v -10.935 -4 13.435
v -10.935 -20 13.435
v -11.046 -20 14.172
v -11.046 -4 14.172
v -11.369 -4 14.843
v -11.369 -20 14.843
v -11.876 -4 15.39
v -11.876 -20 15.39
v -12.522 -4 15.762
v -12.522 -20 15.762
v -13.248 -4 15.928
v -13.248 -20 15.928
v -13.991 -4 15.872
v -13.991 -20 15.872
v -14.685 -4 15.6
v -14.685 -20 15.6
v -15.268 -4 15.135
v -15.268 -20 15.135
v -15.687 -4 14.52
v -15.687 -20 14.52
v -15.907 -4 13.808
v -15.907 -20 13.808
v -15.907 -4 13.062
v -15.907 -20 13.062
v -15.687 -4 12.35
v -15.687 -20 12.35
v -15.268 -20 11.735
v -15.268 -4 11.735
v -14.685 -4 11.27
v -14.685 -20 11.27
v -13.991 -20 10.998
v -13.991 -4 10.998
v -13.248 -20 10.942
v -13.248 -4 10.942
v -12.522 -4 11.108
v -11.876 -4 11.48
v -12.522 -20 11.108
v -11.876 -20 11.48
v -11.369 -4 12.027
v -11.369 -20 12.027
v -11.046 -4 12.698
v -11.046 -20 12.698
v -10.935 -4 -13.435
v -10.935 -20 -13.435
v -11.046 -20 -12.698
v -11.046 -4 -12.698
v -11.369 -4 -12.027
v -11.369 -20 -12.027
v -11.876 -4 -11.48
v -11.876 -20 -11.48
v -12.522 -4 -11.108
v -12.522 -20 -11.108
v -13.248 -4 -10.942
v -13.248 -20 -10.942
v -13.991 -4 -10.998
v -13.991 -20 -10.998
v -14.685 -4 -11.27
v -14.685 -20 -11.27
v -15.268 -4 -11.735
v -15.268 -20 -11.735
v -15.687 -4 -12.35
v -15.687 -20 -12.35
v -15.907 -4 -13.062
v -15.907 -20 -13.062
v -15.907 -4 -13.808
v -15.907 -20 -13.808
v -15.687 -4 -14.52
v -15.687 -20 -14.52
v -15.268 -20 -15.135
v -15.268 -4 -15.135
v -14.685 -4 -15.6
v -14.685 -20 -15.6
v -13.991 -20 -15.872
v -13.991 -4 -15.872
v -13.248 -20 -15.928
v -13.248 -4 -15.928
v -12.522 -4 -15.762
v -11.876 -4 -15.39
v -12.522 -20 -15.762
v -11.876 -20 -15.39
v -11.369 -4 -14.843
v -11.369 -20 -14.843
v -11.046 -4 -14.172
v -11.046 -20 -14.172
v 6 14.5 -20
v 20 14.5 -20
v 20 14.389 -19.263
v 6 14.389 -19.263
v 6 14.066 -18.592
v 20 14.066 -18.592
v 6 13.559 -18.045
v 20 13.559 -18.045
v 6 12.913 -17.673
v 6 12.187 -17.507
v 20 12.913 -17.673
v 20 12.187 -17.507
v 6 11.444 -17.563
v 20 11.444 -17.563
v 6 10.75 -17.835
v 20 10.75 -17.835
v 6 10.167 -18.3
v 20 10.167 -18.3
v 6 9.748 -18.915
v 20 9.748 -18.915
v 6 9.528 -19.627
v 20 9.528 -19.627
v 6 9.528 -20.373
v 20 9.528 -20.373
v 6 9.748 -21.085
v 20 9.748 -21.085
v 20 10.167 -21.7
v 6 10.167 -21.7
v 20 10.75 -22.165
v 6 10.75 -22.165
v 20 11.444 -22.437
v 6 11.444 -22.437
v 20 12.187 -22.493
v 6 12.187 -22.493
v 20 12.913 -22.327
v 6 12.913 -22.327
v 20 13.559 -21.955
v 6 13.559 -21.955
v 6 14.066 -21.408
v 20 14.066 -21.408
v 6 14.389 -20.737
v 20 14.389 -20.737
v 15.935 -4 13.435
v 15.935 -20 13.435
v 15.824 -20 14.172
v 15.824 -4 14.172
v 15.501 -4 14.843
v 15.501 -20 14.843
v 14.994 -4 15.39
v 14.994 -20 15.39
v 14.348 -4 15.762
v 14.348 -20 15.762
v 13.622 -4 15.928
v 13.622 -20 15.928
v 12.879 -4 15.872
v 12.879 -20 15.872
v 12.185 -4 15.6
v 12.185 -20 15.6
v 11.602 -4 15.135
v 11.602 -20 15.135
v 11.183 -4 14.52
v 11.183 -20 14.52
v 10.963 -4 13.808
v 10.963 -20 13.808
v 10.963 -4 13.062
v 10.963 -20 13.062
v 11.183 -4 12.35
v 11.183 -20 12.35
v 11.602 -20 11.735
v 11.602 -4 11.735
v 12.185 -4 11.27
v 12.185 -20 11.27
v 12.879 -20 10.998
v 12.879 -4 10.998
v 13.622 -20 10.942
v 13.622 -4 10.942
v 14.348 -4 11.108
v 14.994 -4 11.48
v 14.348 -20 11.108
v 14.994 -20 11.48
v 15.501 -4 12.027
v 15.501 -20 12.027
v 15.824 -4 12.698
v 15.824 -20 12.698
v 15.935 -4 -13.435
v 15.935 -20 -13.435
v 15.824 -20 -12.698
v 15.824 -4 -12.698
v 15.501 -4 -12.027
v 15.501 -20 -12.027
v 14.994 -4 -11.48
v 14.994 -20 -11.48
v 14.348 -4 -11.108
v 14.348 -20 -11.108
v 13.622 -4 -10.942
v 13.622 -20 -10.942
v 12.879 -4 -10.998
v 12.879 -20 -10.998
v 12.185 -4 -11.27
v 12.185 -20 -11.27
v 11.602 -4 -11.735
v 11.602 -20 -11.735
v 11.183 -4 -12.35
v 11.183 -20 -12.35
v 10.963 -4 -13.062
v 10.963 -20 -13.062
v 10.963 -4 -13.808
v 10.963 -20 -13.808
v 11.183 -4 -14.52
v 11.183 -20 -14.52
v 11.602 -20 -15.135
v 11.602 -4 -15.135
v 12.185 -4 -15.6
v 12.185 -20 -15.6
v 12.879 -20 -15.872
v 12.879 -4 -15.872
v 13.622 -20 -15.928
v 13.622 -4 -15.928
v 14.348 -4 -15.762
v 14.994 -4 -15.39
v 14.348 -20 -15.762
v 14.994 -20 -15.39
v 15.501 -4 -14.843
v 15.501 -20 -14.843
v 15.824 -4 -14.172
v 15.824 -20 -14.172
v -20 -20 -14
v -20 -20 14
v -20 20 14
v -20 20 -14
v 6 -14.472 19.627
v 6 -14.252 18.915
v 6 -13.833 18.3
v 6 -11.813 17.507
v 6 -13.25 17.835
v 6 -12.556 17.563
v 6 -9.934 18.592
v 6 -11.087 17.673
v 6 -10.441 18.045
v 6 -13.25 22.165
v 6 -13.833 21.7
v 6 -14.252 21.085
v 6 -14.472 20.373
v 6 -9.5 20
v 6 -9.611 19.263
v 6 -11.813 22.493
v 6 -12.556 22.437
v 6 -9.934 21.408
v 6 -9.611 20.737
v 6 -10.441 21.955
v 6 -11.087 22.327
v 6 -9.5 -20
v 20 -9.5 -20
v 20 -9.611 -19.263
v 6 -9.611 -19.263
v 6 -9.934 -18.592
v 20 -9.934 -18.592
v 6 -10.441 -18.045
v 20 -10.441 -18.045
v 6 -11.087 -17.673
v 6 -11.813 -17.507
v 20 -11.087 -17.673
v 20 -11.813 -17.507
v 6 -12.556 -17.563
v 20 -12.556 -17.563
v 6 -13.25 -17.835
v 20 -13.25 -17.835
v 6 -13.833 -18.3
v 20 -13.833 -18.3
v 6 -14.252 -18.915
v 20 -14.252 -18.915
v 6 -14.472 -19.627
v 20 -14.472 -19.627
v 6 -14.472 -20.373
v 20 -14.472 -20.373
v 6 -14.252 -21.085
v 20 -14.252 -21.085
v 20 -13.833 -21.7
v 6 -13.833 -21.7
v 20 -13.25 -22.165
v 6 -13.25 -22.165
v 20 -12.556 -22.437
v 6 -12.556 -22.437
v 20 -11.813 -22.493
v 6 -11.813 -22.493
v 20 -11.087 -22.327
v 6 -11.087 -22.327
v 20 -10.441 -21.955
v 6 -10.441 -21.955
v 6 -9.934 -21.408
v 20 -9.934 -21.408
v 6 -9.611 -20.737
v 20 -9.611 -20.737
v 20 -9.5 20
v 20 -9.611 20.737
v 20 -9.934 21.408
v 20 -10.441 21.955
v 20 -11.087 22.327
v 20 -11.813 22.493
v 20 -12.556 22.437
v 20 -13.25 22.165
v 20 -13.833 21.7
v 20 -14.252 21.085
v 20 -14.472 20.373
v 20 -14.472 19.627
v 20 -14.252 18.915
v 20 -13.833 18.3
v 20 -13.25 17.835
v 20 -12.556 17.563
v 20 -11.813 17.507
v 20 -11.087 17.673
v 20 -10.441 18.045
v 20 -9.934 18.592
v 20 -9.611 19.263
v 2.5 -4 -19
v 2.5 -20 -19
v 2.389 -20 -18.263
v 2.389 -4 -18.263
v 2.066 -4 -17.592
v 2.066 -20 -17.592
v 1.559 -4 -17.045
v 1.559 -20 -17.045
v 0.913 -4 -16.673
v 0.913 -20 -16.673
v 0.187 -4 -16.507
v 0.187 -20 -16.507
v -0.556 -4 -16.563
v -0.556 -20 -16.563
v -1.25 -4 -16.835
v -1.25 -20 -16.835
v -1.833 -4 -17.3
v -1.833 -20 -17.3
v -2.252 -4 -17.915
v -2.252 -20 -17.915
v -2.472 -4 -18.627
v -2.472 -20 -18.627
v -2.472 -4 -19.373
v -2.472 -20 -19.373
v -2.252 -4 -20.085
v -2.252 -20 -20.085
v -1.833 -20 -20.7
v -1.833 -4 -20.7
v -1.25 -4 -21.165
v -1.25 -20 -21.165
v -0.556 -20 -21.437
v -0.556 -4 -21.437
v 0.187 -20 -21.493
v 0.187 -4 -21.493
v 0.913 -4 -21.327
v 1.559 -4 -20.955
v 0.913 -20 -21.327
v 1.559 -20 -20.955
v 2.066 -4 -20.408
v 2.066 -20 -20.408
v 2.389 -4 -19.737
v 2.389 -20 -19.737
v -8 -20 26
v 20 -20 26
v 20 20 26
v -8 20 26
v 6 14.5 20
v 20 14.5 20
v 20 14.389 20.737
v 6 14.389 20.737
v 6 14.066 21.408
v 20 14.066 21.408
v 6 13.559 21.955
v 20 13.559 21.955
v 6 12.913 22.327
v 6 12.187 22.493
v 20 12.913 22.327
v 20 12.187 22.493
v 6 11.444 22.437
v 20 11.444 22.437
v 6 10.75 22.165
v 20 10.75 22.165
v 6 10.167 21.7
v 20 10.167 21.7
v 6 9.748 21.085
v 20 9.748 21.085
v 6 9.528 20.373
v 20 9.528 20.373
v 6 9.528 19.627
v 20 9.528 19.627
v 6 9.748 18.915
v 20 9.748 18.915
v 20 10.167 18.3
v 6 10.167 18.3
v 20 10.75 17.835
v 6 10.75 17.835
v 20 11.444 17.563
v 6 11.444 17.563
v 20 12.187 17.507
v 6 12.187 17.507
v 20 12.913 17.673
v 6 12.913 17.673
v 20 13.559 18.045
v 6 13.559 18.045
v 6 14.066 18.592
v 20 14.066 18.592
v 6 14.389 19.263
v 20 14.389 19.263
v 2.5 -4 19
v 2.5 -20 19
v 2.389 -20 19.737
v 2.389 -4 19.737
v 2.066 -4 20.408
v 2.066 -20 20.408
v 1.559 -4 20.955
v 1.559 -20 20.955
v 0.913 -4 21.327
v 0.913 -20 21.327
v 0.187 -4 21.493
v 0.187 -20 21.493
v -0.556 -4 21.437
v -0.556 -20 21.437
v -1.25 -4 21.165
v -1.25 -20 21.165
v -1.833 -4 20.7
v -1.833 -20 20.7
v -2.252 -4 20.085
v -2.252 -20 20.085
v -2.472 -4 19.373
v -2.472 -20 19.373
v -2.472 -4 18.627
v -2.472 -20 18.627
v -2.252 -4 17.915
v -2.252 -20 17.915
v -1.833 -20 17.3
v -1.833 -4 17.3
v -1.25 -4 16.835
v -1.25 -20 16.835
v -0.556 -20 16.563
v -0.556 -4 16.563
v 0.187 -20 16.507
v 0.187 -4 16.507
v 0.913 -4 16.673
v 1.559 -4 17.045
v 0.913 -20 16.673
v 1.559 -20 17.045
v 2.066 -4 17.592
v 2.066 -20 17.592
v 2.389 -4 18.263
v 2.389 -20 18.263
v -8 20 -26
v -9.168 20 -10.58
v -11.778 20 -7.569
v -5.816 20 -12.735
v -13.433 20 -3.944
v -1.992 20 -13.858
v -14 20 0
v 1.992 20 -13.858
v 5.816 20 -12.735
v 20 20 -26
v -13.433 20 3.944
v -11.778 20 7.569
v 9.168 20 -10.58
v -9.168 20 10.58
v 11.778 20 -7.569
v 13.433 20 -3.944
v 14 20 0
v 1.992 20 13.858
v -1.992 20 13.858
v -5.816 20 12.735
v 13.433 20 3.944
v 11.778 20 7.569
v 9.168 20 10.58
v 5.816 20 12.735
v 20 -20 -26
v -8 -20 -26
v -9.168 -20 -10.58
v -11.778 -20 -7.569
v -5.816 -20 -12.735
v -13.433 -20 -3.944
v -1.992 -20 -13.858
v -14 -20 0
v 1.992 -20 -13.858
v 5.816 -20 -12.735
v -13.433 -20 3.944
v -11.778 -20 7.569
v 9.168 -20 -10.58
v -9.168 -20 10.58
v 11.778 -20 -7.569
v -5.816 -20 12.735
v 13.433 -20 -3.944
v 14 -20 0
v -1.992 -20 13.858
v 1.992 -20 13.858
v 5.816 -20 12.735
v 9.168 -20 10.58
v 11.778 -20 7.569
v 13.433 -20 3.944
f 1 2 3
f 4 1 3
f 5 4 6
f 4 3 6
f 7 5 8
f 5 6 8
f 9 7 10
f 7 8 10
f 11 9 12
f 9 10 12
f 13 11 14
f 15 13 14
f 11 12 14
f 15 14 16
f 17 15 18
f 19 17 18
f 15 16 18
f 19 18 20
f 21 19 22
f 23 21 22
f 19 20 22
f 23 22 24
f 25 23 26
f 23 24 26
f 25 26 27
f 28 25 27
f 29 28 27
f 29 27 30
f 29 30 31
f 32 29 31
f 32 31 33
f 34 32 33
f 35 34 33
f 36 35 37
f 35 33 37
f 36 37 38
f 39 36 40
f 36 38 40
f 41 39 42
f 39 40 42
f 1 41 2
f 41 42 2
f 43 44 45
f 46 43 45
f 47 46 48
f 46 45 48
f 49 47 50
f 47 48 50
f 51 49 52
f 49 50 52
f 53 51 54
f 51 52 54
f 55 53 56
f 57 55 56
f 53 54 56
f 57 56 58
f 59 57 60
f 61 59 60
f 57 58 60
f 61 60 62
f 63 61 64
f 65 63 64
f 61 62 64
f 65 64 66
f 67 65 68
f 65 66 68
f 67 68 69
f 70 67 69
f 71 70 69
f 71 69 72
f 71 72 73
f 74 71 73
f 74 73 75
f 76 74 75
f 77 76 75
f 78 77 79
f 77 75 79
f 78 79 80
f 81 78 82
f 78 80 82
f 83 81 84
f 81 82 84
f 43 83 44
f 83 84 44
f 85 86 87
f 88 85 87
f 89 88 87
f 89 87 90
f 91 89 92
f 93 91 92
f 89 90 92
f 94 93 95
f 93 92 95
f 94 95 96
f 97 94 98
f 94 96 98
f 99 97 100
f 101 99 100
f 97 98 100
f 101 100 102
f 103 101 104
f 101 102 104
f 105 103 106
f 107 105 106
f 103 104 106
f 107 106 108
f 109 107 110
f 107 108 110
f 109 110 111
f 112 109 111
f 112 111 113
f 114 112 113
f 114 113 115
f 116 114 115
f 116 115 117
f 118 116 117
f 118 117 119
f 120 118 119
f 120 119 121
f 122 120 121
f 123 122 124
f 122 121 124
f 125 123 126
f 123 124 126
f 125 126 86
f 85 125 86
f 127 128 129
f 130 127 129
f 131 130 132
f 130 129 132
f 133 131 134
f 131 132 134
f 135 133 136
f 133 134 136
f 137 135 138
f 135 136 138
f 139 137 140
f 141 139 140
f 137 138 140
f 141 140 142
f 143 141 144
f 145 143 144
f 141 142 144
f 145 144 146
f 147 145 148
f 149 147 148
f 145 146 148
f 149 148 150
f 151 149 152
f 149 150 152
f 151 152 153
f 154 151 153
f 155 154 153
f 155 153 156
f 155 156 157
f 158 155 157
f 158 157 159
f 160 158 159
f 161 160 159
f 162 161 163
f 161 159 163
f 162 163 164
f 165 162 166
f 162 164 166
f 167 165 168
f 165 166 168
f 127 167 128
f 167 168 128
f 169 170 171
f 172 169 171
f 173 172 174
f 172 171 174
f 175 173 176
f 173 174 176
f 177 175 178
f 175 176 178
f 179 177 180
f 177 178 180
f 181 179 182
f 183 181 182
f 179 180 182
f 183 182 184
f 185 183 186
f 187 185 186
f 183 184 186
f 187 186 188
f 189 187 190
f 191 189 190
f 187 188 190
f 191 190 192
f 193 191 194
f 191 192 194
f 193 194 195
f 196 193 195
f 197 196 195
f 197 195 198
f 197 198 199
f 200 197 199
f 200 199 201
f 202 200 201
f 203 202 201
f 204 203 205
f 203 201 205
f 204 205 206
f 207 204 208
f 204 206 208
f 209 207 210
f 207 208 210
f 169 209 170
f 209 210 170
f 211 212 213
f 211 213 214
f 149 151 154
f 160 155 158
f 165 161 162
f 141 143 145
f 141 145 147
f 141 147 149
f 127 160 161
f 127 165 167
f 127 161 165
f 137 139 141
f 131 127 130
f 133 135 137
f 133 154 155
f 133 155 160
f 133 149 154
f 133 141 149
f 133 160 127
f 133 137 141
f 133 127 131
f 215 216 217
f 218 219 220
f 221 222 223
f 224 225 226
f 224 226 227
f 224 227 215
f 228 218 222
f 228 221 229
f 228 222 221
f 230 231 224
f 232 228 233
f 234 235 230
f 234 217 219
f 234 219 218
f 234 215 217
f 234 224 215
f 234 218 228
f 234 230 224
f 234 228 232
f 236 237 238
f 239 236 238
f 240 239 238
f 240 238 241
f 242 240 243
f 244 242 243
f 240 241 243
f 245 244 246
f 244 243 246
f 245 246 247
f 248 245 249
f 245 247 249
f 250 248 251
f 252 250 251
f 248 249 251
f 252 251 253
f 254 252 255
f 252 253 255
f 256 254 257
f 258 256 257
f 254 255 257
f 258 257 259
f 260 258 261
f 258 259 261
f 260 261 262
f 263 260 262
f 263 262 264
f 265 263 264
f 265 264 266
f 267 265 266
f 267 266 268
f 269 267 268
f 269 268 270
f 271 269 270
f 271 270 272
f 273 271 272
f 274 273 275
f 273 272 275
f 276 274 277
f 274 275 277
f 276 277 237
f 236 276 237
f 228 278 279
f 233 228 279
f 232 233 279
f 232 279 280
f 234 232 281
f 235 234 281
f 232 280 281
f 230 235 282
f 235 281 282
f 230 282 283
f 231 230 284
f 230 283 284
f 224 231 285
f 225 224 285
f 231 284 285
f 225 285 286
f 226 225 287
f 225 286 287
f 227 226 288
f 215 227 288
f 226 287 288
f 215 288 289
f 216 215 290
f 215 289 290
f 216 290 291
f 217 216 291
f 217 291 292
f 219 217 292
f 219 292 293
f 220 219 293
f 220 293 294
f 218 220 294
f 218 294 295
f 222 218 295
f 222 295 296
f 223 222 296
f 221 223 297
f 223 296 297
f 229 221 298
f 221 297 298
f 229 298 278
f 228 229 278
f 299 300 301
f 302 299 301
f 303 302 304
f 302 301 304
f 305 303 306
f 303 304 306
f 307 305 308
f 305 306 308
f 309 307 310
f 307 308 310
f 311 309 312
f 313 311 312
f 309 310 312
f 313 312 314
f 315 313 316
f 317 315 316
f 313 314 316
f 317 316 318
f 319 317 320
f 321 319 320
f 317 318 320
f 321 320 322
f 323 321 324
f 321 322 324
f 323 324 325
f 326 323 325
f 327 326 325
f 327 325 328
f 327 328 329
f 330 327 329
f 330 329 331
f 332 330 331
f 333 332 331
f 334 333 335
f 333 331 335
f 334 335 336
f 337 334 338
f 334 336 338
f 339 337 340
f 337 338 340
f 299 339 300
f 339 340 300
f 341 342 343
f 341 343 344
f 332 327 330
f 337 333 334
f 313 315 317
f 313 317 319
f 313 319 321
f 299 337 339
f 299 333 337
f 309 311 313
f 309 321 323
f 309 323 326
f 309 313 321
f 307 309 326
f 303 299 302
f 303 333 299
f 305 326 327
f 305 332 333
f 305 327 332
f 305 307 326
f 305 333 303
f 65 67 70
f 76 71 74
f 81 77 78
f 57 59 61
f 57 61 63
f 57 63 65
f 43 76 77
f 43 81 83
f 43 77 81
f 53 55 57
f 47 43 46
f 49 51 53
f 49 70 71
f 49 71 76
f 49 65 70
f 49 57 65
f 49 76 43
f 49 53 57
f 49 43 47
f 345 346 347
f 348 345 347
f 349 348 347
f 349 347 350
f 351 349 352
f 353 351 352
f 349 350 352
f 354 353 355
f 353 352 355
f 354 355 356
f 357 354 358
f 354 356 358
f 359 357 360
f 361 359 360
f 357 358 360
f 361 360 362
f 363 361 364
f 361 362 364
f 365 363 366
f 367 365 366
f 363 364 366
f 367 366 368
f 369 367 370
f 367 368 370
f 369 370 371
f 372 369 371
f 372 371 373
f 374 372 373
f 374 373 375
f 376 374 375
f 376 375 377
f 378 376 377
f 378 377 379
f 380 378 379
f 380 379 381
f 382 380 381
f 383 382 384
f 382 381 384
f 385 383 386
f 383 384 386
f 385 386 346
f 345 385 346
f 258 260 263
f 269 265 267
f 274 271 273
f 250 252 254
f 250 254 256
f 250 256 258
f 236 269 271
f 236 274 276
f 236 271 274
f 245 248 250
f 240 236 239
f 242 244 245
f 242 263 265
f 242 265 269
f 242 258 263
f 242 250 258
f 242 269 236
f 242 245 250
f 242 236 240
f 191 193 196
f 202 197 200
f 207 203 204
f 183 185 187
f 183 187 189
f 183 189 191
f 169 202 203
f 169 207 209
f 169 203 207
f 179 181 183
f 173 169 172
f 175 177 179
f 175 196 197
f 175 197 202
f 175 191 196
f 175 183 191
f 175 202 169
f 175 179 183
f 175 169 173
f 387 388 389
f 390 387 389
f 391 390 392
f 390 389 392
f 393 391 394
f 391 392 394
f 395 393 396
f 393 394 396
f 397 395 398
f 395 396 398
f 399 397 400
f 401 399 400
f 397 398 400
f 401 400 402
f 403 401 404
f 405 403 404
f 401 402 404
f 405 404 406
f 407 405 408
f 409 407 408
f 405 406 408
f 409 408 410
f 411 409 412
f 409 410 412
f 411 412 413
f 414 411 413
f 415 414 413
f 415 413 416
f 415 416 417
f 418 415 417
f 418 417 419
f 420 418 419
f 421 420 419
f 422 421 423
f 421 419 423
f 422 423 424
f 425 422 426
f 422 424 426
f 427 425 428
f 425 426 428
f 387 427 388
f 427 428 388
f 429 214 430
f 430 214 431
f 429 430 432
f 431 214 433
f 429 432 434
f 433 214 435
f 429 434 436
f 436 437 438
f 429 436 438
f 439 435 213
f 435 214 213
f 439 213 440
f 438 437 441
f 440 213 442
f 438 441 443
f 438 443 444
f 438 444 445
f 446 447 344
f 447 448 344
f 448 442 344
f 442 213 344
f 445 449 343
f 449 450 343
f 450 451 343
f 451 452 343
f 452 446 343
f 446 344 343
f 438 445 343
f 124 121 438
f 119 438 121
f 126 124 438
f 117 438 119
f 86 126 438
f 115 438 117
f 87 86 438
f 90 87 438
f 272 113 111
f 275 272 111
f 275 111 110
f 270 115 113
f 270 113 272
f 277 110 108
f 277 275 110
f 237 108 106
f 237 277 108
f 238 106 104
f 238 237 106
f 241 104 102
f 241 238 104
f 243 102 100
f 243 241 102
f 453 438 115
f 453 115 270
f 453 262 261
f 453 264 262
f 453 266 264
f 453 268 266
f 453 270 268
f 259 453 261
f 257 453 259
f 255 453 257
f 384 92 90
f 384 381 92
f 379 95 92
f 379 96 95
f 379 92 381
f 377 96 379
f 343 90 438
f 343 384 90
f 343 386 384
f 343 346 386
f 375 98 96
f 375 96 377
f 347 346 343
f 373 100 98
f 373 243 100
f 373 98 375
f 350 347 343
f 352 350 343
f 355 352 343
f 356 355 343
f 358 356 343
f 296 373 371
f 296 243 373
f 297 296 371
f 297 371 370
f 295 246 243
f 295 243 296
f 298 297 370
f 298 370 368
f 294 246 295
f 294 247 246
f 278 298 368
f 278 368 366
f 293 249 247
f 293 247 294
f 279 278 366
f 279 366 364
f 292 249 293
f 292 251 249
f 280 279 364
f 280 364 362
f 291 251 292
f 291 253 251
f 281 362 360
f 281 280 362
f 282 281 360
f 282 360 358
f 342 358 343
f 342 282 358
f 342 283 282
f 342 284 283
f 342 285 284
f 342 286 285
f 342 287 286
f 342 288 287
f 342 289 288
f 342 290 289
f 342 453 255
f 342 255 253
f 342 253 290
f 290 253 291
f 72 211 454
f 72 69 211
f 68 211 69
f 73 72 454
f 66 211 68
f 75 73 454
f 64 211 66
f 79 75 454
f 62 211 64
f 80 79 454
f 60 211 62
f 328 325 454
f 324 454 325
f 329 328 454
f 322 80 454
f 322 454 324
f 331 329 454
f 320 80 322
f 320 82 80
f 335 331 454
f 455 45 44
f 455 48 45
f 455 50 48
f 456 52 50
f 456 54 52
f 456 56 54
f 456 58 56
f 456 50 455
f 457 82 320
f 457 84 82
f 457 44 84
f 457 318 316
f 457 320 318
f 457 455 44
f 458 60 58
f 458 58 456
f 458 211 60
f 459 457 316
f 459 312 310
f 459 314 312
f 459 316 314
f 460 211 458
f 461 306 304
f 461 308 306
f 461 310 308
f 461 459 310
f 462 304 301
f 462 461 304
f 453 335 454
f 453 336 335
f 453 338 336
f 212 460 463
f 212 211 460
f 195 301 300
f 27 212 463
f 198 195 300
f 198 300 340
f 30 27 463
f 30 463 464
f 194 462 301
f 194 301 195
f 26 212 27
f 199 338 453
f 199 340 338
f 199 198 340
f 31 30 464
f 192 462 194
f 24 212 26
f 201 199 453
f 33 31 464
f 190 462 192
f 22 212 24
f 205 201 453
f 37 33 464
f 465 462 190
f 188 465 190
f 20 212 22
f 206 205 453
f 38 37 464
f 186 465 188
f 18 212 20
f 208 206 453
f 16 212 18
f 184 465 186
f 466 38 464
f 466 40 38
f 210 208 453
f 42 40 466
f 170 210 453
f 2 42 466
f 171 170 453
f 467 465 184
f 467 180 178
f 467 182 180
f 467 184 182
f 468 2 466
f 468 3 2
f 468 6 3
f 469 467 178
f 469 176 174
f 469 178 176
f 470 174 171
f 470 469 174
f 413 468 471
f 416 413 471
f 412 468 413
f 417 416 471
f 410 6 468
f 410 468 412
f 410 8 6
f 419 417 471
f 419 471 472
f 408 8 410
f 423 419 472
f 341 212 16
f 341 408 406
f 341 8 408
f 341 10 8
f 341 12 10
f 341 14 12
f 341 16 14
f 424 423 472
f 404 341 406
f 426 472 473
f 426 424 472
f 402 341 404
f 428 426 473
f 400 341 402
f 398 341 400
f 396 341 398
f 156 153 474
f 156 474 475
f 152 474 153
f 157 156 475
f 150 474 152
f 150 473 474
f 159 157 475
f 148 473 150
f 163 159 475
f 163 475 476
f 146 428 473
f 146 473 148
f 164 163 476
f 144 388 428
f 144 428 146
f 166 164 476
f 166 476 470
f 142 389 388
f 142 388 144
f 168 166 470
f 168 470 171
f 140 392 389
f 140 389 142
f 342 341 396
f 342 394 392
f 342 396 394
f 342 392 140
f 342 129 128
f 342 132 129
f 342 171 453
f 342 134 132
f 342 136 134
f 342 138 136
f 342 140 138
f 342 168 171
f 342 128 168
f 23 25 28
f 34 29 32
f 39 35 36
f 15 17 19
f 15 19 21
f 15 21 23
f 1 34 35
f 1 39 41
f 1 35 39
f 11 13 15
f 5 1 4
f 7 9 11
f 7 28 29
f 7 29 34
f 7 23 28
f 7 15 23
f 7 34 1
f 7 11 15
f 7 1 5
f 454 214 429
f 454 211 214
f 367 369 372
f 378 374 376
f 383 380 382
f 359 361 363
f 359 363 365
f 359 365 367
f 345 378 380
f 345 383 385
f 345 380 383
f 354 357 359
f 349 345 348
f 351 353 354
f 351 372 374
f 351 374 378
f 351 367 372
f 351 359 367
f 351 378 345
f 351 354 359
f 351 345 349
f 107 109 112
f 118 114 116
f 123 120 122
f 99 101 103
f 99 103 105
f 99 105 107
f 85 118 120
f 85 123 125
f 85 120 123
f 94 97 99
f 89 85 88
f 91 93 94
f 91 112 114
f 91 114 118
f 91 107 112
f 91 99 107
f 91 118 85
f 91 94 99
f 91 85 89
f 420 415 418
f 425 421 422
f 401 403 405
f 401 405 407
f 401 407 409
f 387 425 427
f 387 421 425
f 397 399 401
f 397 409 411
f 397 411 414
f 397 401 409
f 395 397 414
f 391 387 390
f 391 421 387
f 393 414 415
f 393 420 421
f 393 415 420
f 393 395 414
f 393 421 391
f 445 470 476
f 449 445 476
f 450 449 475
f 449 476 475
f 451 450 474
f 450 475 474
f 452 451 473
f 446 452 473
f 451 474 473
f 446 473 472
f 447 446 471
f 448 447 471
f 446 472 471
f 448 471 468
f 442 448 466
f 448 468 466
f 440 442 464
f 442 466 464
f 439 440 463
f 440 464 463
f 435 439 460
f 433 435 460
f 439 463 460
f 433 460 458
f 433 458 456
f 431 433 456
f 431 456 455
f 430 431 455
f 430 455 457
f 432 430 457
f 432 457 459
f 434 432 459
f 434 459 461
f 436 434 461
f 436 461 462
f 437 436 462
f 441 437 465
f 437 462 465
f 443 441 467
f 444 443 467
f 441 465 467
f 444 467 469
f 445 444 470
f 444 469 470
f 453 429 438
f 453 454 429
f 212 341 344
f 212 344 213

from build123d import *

# Parameters (mm, degrees)
F1_DEPTH = 20
F2_R     = 14
F3_DEPTH = 40
F4_R     = 2.5
F5_DEPTH = 16
F6_R     = 2.5
F7_DEPTH = 14


with BuildPart() as f1:
    # F0 (on Front) → F1 (new body, symmetric)
    with BuildSketch(Plane.XZ):
        Polygon((20, -26), (20, 26), (-8, 26), (-20, 14), (-20, -14), (-8, -26), align=None)
    extrude(amount=F1_DEPTH, both=True)

    # F2 (on face) → F3 (cut)
    with BuildSketch(Plane.XZ.offset(20)):
        Circle(F2_R)
    extrude(amount=-F3_DEPTH, mode=Mode.SUBTRACT)

    # F4 (on face) → F5 (cut)
    with BuildSketch(Plane.XZ.offset(20)):
        with Locations((-13.435029, 13.435029)):
            Circle(F4_R)
        with Locations((13.435029, 13.435029)):
            Circle(F4_R)
        with Locations((-13.435029, -13.435029)):
            Circle(F4_R)
        with Locations((13.435029, -13.435029)):
            Circle(F4_R)
        with Locations((0, 19)):
            Circle(F4_R)
        with Locations((0, -19)):
            Circle(F4_R)
    extrude(amount=-F5_DEPTH, mode=Mode.SUBTRACT)

    # F6 (on face) → F7 (cut)
    with BuildSketch(Plane.YZ.offset(20)):
        with Locations((-12, 20)):
            Circle(F6_R)
        with Locations((12, 20)):
            Circle(F6_R)
        with Locations((12, -20)):
            Circle(F6_R)
        with Locations((-12, -20)):
            Circle(F6_R)
    extrude(amount=-F7_DEPTH, mode=Mode.SUBTRACT)


solid = f1.part
